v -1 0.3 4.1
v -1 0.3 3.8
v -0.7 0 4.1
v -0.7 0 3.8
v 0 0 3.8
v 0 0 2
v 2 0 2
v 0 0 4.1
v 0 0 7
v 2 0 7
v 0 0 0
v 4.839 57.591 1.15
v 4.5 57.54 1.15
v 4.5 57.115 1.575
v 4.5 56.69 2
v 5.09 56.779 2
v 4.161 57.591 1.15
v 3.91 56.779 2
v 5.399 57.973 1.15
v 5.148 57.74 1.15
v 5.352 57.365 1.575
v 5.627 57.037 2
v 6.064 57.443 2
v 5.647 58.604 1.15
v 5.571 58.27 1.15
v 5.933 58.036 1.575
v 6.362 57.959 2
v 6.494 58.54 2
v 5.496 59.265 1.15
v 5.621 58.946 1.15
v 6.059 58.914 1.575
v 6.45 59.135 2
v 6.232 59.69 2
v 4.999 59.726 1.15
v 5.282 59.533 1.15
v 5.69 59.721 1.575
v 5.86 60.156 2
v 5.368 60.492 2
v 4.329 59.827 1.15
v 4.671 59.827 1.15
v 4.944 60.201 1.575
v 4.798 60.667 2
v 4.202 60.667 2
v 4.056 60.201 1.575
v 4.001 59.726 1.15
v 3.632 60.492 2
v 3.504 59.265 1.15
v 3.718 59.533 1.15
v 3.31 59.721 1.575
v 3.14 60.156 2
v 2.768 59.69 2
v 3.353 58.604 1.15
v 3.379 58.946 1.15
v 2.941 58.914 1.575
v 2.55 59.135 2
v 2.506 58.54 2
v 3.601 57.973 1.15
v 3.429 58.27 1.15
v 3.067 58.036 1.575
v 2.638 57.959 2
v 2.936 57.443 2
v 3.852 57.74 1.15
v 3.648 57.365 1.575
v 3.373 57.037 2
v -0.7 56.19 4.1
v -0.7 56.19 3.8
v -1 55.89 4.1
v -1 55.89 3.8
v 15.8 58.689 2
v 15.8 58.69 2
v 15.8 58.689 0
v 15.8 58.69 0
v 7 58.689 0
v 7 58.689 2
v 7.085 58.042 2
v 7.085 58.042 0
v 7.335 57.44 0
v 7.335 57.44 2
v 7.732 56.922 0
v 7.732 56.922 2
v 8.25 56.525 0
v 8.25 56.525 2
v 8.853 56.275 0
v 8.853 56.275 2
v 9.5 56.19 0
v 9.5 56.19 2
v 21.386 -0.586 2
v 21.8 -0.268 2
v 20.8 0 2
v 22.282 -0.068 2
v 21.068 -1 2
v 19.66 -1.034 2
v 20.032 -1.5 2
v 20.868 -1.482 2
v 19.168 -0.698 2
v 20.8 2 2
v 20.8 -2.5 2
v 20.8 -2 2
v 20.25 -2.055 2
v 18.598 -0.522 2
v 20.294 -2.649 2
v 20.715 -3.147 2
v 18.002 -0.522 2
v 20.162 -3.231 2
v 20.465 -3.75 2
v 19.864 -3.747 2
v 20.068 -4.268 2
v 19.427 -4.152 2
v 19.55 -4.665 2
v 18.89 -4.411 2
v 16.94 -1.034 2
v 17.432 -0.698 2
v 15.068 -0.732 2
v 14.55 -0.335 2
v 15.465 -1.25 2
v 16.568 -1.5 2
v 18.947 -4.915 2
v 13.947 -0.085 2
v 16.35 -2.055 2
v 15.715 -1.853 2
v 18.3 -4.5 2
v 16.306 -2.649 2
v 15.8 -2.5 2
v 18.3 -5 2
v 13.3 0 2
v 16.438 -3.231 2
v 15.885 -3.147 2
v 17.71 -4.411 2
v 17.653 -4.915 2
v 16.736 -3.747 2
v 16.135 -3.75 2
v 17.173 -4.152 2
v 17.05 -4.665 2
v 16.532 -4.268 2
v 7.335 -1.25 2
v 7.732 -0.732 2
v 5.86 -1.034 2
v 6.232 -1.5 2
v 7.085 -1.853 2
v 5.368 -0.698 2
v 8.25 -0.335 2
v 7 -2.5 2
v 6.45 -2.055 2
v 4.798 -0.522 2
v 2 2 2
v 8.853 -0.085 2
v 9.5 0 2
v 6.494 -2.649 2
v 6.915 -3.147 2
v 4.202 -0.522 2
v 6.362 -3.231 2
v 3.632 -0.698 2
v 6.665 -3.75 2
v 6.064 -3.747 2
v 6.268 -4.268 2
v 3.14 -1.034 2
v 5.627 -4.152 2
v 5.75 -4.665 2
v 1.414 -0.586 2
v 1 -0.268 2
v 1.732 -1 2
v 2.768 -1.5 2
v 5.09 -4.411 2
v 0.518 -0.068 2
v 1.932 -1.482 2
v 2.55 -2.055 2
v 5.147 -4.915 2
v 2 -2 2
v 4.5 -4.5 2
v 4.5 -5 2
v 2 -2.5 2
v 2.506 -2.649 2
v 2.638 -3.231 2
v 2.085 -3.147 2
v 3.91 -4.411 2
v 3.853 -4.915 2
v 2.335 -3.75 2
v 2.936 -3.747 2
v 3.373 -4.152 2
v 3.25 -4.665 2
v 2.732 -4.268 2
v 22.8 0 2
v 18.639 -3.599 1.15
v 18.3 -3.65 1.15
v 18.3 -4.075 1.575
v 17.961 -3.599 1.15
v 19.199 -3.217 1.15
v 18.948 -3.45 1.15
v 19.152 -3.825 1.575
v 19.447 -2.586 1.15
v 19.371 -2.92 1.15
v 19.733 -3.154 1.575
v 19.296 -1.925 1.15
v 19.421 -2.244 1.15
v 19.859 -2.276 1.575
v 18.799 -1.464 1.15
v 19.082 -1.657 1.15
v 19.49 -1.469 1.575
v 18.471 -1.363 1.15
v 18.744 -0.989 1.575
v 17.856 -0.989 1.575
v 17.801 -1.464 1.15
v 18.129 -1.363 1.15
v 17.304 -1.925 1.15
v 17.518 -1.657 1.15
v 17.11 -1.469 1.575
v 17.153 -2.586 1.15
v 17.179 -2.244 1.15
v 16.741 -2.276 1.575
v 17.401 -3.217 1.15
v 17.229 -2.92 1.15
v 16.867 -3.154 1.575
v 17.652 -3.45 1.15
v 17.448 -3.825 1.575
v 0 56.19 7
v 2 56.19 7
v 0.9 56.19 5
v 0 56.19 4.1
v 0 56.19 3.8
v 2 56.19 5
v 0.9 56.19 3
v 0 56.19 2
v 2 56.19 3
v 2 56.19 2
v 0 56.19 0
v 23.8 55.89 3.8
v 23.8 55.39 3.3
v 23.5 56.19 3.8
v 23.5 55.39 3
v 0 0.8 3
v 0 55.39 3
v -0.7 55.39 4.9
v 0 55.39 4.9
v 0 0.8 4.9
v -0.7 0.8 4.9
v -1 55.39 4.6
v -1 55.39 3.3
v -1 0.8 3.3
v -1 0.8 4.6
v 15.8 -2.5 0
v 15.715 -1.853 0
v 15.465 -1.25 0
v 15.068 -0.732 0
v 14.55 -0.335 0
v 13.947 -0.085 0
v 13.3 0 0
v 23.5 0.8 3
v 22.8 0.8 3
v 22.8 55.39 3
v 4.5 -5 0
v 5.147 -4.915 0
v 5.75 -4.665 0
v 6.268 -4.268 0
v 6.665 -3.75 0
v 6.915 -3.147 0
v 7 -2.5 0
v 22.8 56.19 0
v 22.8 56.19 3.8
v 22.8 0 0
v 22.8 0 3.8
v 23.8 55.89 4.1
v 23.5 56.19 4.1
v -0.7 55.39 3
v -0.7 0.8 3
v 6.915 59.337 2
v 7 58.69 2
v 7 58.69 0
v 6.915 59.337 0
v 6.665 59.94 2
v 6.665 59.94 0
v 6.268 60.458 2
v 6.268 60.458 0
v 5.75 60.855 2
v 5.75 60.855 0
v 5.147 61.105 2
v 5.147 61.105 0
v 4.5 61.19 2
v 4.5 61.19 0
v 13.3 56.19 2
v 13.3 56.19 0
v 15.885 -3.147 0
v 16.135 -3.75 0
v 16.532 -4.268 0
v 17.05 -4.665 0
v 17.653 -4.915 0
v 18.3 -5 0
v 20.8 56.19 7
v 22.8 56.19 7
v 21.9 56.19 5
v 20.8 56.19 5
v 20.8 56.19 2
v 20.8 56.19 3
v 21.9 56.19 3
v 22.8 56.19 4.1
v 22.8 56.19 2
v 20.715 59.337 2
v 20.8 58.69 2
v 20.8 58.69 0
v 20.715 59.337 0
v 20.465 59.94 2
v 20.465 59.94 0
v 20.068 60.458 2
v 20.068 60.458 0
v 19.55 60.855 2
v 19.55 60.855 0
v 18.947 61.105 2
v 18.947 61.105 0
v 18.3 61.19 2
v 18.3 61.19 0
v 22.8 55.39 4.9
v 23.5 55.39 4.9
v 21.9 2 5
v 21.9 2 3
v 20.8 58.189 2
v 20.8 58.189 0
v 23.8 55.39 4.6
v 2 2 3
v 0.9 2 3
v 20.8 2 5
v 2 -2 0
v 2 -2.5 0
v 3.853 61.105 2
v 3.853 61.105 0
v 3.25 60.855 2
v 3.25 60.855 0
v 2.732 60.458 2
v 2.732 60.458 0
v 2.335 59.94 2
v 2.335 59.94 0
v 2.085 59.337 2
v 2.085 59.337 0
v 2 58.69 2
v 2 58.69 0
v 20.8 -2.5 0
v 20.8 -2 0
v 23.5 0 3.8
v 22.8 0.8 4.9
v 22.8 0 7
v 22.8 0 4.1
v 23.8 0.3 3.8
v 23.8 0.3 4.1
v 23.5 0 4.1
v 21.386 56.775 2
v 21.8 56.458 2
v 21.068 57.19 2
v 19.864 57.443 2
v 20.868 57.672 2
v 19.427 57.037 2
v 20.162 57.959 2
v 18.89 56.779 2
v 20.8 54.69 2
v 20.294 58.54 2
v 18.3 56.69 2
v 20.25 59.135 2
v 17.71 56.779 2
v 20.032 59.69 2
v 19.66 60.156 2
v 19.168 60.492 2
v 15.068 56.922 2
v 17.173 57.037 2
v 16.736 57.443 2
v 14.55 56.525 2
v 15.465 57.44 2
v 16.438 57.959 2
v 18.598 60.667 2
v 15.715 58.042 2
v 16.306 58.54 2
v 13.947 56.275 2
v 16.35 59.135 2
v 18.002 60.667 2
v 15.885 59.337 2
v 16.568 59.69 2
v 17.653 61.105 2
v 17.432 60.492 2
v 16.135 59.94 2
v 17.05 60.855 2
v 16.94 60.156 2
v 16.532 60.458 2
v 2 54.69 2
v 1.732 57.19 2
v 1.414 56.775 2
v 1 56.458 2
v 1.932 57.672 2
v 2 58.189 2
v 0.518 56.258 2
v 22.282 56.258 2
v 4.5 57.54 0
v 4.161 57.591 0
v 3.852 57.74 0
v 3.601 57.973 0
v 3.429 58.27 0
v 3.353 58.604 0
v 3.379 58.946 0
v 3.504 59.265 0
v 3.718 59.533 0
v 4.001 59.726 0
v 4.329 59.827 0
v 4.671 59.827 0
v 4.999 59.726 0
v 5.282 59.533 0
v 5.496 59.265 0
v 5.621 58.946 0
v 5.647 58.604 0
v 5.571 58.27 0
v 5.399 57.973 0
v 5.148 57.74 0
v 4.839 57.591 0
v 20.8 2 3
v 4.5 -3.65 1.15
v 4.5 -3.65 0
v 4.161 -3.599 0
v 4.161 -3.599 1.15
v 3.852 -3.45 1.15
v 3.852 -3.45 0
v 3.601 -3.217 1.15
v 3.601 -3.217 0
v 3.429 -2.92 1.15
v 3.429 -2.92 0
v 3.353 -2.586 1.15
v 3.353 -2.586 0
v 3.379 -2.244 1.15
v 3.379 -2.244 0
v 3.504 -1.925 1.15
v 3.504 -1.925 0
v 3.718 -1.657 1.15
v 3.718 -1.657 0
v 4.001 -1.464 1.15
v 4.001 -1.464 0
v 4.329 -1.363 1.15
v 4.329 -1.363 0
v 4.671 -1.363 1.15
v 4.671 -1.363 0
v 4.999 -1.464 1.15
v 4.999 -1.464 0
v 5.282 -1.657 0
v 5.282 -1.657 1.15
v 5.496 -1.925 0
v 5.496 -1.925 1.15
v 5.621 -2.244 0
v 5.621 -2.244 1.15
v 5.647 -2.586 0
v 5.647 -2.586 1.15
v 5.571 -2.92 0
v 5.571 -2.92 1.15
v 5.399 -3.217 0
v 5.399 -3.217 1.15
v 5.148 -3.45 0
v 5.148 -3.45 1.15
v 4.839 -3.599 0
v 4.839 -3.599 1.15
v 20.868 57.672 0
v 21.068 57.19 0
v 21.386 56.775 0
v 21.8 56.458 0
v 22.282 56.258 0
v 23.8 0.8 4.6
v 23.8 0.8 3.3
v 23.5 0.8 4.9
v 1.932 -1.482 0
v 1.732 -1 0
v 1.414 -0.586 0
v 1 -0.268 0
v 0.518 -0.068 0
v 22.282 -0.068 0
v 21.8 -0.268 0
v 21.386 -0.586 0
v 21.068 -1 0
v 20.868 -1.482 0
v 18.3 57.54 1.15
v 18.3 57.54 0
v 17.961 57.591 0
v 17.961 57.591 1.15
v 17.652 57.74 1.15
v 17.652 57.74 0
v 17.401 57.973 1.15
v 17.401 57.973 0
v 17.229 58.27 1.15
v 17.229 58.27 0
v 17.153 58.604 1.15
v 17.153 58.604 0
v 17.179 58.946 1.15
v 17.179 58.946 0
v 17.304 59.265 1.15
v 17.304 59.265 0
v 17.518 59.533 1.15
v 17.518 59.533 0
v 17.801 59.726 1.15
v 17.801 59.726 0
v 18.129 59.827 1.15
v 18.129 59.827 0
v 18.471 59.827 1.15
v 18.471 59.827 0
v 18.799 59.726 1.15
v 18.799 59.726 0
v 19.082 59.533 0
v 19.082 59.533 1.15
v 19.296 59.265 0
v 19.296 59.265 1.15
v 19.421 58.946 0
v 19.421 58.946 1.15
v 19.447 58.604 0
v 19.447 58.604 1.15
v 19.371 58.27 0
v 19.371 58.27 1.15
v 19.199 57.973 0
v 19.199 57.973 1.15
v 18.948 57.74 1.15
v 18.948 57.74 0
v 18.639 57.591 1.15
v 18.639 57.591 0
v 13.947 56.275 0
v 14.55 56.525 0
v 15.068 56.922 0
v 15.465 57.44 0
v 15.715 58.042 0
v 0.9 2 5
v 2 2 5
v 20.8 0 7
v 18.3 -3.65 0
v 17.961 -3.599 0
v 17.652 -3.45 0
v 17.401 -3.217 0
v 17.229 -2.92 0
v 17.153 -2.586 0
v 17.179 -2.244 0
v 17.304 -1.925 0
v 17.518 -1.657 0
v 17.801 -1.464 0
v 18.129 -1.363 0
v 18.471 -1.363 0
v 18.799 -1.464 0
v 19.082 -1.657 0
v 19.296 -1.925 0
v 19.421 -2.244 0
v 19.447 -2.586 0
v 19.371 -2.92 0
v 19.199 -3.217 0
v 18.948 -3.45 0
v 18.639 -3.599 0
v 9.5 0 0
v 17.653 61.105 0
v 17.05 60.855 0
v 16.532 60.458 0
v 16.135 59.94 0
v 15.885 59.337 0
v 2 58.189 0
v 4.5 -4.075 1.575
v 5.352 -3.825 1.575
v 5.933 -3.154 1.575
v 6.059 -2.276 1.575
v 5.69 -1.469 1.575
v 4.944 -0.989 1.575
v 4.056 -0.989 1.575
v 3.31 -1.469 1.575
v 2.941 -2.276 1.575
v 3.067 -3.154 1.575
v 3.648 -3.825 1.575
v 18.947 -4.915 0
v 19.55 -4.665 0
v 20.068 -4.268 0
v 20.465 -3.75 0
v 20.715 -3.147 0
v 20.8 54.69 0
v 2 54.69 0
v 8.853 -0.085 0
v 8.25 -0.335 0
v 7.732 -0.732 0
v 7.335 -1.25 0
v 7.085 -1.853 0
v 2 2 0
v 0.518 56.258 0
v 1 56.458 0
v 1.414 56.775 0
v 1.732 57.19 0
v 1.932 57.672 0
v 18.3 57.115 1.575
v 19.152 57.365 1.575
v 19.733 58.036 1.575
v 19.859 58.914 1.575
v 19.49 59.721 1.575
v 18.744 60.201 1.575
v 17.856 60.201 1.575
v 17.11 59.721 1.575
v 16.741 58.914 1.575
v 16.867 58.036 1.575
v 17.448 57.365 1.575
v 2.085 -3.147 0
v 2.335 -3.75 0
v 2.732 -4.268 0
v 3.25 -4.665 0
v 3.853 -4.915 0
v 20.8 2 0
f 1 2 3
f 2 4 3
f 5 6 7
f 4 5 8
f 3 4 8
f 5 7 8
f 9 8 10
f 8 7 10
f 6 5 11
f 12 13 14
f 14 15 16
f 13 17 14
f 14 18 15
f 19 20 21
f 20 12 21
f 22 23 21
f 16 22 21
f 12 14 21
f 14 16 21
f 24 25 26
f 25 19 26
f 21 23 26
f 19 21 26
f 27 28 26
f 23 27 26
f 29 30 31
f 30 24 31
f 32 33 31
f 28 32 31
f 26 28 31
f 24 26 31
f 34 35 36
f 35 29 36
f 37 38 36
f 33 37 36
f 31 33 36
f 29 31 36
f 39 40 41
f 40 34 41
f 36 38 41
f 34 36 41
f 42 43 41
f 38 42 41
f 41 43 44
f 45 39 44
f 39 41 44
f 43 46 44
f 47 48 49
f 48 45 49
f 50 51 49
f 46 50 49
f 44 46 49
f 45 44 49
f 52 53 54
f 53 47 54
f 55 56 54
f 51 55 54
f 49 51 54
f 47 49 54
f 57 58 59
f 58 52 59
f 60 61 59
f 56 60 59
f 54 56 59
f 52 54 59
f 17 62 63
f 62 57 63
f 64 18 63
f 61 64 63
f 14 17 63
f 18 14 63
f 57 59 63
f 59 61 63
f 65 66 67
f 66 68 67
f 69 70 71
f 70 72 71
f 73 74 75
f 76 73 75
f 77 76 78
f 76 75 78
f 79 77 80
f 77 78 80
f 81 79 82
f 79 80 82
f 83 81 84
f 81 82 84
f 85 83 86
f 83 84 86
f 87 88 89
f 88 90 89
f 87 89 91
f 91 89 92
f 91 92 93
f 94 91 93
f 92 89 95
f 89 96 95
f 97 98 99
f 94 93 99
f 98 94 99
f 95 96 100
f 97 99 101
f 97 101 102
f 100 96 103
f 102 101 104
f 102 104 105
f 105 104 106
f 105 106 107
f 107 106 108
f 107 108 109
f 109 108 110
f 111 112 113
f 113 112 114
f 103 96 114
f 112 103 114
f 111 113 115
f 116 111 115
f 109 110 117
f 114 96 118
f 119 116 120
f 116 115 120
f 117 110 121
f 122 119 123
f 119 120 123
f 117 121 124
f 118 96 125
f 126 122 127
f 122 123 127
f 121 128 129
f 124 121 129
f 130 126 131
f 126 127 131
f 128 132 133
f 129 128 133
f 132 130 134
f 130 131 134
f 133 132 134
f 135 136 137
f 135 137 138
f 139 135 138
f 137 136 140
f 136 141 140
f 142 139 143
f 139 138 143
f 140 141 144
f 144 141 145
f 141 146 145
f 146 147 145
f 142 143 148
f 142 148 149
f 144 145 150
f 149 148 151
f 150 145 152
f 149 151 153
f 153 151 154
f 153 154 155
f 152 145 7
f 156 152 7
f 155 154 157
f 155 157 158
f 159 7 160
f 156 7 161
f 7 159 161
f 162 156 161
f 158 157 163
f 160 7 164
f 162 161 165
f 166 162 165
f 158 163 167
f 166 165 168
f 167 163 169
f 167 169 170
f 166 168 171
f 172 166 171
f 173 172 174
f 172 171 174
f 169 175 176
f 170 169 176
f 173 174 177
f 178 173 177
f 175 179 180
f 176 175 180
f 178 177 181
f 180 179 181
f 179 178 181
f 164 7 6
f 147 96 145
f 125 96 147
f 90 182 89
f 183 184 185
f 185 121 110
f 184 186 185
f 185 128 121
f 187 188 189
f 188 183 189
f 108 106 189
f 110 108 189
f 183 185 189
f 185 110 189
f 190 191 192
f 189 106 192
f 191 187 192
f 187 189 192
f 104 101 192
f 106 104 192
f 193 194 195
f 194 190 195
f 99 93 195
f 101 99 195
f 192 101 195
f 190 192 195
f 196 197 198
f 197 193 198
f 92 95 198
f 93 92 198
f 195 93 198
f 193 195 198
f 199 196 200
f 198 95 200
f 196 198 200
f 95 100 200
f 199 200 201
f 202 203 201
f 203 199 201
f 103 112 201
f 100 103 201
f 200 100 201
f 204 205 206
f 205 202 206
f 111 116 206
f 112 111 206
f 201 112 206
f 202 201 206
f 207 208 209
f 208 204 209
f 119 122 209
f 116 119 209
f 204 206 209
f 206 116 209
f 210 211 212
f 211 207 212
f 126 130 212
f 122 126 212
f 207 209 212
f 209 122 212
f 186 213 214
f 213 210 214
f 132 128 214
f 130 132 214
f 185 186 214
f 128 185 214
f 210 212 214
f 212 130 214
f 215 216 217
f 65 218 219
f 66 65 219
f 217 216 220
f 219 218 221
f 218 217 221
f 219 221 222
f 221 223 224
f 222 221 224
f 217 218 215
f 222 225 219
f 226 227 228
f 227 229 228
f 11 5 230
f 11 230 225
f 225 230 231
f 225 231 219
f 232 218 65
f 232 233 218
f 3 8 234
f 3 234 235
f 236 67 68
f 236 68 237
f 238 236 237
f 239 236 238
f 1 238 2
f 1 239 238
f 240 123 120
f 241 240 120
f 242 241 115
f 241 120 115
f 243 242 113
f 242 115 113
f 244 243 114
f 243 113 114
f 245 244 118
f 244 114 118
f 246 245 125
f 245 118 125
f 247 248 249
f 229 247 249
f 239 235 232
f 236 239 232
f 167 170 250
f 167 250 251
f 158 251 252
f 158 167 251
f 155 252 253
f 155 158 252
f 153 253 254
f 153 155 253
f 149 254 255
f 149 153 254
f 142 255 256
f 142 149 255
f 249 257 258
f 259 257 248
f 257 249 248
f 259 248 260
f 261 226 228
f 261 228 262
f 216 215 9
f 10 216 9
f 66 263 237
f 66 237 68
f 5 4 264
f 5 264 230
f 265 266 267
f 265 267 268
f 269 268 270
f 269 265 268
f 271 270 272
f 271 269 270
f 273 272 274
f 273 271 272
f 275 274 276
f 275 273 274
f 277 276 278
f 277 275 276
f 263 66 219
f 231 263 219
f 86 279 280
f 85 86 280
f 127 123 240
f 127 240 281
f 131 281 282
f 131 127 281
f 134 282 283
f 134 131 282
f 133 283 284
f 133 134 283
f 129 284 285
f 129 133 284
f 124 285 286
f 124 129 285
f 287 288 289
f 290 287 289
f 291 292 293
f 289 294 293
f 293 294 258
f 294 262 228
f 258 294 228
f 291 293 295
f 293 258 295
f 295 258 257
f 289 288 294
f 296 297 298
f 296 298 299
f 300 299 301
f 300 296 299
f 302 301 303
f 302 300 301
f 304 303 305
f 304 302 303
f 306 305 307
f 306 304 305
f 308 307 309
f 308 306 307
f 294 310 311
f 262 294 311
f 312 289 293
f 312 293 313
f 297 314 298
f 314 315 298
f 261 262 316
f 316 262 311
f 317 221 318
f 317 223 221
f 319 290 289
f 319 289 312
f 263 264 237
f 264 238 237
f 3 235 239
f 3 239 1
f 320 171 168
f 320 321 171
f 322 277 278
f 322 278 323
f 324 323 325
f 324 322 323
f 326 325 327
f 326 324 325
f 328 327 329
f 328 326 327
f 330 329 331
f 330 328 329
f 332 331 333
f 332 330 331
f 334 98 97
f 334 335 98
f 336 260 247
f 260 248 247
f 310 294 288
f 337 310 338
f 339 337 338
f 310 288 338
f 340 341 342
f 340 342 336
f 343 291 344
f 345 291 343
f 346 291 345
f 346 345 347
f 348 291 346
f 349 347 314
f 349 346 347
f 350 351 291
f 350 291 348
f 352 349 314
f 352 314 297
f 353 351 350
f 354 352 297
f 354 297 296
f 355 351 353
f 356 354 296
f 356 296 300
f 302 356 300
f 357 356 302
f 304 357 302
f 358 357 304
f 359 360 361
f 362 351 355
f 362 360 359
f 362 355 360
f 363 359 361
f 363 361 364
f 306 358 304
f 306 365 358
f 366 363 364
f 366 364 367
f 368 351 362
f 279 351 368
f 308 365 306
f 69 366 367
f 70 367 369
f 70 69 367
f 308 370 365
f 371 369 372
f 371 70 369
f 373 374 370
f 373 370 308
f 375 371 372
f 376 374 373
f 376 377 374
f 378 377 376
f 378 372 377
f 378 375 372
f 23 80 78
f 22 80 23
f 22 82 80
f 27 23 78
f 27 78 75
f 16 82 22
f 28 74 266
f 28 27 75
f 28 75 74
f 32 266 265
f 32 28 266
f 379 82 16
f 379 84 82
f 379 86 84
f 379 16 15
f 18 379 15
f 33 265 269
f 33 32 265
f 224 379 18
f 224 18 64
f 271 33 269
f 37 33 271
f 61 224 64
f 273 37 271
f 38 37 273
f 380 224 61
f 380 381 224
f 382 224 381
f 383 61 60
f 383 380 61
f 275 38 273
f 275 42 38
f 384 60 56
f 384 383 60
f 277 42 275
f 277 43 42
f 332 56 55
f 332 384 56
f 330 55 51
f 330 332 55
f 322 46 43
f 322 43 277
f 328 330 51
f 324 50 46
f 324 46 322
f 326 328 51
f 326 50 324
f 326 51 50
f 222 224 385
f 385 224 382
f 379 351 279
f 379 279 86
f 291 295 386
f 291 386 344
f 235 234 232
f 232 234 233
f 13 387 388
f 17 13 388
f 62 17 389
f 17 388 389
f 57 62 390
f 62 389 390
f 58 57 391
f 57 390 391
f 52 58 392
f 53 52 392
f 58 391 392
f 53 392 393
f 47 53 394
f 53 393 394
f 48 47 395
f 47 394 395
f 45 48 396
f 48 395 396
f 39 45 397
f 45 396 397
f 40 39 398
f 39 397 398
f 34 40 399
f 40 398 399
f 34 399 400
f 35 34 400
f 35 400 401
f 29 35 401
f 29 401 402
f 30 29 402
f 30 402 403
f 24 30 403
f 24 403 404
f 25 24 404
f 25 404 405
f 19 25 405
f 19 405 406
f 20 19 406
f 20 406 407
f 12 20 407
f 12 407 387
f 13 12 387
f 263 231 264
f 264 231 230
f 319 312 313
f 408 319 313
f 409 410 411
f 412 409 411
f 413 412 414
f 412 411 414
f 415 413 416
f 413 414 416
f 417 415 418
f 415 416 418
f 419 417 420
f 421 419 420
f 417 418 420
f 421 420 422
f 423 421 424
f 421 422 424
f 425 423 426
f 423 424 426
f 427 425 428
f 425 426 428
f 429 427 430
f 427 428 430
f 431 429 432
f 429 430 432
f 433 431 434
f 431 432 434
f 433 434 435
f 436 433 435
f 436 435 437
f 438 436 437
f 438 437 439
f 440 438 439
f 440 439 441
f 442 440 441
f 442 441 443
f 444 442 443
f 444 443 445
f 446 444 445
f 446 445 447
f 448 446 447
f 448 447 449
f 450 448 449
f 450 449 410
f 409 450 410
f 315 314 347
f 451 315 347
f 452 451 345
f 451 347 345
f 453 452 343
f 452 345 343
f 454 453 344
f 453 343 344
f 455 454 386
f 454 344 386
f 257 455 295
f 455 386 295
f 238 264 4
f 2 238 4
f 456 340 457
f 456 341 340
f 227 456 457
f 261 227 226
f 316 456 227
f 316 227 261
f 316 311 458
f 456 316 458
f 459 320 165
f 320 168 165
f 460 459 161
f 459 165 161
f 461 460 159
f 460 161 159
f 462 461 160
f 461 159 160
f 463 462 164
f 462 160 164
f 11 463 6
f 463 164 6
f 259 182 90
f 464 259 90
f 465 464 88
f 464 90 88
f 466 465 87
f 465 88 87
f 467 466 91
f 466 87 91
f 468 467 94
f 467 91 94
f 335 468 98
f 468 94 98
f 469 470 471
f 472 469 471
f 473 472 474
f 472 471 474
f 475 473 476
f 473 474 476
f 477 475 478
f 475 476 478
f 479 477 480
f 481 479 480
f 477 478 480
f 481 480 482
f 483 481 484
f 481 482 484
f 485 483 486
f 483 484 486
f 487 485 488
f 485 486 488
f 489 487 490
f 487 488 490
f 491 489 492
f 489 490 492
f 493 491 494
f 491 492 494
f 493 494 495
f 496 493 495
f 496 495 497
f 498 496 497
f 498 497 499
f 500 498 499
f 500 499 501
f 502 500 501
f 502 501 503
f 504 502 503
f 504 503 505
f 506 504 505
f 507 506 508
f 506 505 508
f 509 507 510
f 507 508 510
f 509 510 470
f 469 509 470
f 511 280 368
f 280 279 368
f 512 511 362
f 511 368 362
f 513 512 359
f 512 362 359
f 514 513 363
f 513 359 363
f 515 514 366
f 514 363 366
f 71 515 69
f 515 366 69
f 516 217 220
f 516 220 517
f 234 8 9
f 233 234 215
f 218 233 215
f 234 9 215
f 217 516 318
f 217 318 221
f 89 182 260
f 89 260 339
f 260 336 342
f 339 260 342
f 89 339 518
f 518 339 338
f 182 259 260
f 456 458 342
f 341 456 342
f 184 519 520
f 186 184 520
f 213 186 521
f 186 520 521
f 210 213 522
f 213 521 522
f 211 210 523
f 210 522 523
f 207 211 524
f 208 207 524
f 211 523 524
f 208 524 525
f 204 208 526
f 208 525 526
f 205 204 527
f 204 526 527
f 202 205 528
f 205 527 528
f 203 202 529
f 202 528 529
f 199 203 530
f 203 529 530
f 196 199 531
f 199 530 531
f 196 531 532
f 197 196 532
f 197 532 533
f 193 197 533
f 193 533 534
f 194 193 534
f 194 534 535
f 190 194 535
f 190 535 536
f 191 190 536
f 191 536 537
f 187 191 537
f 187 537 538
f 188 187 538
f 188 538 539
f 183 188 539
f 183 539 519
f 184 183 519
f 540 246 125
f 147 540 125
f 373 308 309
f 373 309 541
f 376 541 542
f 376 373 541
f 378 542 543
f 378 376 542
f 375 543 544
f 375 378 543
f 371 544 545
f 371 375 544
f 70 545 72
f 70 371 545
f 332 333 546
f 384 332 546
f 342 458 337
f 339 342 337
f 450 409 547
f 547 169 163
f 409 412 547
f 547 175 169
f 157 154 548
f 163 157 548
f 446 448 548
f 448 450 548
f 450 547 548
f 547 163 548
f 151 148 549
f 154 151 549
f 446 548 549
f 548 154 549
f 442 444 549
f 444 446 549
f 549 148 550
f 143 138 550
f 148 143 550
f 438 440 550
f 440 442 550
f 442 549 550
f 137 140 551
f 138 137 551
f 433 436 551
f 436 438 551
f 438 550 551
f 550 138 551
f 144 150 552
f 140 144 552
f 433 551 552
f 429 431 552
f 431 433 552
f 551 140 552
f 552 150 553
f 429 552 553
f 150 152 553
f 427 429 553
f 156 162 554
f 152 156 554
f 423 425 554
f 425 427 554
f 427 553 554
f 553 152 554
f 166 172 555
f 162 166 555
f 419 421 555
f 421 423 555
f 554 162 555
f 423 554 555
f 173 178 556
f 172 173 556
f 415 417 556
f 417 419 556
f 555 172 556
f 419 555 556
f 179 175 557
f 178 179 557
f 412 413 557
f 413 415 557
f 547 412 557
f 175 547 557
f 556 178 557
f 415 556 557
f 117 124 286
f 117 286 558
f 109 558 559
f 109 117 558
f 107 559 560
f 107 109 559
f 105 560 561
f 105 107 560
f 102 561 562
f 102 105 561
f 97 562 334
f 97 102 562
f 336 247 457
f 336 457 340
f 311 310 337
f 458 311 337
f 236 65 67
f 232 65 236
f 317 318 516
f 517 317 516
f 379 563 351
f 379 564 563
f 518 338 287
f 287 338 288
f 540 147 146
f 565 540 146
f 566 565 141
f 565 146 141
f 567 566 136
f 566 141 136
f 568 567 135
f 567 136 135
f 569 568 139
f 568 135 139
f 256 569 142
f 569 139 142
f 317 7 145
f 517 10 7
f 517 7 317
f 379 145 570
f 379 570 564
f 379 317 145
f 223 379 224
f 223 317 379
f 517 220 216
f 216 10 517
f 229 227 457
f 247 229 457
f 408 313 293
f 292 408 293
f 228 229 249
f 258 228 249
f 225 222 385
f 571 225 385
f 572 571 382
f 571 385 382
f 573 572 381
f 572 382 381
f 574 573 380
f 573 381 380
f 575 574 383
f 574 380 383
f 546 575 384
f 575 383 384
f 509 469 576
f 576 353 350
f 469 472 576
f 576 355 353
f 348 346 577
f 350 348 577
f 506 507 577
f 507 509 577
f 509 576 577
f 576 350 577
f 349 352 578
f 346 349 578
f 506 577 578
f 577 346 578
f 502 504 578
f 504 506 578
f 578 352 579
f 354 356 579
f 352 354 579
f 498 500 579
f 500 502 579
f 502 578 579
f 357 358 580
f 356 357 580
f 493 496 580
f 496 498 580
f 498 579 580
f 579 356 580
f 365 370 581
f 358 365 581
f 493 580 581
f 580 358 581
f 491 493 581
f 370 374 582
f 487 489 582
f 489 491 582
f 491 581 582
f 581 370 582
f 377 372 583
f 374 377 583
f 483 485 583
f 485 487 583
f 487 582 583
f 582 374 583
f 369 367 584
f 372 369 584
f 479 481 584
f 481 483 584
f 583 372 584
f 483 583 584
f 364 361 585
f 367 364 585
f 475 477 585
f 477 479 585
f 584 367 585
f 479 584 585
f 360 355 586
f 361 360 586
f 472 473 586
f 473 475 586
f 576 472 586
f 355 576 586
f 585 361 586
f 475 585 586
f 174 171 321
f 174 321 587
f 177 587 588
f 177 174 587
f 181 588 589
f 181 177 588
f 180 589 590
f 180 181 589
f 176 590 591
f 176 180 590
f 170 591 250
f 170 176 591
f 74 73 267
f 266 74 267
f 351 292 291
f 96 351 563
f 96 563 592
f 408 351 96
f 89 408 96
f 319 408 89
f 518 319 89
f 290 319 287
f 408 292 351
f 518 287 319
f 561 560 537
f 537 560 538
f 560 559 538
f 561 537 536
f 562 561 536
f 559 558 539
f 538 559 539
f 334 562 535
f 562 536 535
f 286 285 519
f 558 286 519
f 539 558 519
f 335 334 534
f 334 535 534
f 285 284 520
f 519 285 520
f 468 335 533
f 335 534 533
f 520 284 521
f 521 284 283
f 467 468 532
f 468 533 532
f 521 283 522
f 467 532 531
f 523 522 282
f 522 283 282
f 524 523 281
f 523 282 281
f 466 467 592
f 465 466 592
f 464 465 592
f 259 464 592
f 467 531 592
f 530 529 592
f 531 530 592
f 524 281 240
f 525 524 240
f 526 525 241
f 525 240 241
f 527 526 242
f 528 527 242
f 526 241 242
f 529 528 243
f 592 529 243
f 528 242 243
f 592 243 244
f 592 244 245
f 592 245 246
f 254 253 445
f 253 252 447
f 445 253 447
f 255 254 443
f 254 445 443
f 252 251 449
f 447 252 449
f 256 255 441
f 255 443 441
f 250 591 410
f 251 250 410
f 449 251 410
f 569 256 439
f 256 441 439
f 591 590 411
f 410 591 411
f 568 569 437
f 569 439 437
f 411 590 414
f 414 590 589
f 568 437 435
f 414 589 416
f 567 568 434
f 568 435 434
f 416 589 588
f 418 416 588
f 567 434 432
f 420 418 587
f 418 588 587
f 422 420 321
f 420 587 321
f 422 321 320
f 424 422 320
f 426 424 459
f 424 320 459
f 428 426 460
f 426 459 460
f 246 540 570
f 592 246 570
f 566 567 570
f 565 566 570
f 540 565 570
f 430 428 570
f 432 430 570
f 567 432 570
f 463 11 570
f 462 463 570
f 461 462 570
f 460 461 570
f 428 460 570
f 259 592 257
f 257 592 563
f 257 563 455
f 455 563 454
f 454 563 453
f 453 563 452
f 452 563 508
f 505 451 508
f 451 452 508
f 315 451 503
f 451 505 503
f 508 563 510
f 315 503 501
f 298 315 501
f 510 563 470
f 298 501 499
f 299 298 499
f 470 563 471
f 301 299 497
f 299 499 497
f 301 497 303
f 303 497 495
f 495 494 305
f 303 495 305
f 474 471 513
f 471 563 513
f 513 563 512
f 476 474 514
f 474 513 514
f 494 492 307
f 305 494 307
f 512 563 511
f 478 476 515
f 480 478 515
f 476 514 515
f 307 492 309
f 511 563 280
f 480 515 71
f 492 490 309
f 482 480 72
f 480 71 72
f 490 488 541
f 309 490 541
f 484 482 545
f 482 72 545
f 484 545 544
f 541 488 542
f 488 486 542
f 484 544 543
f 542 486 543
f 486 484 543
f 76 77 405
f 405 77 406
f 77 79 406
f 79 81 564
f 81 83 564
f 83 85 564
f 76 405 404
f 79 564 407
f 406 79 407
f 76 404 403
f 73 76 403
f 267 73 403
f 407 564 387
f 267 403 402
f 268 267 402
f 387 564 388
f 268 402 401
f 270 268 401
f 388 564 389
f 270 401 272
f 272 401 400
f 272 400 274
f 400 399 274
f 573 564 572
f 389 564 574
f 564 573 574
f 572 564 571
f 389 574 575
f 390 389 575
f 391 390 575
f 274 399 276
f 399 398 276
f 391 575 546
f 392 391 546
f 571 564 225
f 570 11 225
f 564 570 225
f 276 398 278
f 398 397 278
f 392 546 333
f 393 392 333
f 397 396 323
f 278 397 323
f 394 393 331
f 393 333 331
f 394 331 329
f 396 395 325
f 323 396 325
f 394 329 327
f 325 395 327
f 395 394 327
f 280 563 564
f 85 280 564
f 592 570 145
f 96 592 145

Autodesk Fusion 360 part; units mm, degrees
sketch "Sketch1" plane through (0, 0, 0) normal (1, 0, 0) x (0, 1, 0)
  line L0 (0, 0) -> (56.1898, 0)
  line L1 (56.1898, 0) -> (56.1898, 7)
  line L2 (56.1898, 7) -> (0, 7)
  line L3 (0, 7) -> (0, 0)
  dimension "d1" = 7
extrude "Extrude1" add sketch "Sketch1" along normal blind 1
sketch "Sketch2" plane through (1, 0, 0) normal (1, 0, 0) x (0, 1, 0)
  line L0 (0, 7) -> (0, 0)
  line L1 (0, 0) -> (56.1898, 0)
  line L2 (56.1898, 0) -> (56.1898, 7)
  line L3 (56.1898, 7) -> (0, 7)
  line L4 (0, 0) -> (56.1898, 0)
  line L5 (56.1898, 0) -> (56.1898, 3)
  line L6 (56.1898, 3) -> (0, 3)
  line L7 (0, 3) -> (0, 0)
  line L8 (0, 7) -> (56.1898, 7)
  line L9 (56.1898, 7) -> (56.1898, 5)
  line L10 (56.1898, 5) -> (0, 5)
  line L11 (0, 5) -> (0, 7)
  line L12 (0, 3) -> (2, 3)
  line L13 (2, 3) -> (2, 5)
  line L14 (2, 5) -> (0, 5)
  line L15 (0, 5) -> (0, 3)
  dimension "d4" = 3
  dimension "d5" = 2
  dimension "d12" = 2
extrude "Extrude2" add sketch "Sketch2" along normal blind 1 contours L0 L2 L3 L8 L9 L10 L11 L14 | L0 L6 L10 L12 L13 L14 L15 | L0 L1 L2 L4 L5 L6 L7 L12
sketch "Sketch3" plane through (0, 0, 0) normal (-1, 0, 0) x (0, -1, 0)
  line L0 (0, 0) -> (0, 7)
  line L1 (0, 7) -> (-56.1898, 7)
  line L2 (-56.1898, 7) -> (-56.1898, 0)
  line L3 (-56.1898, 0) -> (0, 0)
  line L4 (-56.1898, 3) -> (0, 3)
  line L5 (0, 3) -> (0, 4.9)
  line L6 (0, 4.9) -> (-56.1898, 4.9)
  line L7 (-56.1898, 4.9) -> (-56.1898, 3)
  dimension "d8" = 1.9
  dimension "d9" = 3
extrude "Extrude3" add sketch "Sketch3" along normal blind 1 contours L0 L2 L4 L5 L6 L7
sketch "Sketch4" plane through (2, 0, 0) normal (1, 0, 0) x (0, 1, 0)
  line L0 (0, 7) -> (0, 0)
  line L1 (0, 0) -> (56.1898, 0)
  line L2 (56.1898, 0) -> (56.1898, 3)
  line L3 (56.1898, 3) -> (2, 3)
  line L4 (2, 3) -> (2, 5)
  line L5 (2, 5) -> (56.1898, 5)
  line L6 (56.1898, 5) -> (56.1898, 7)
  line L7 (56.1898, 7) -> (0, 7)
  line L8 (0, 0) -> (2, 0)
  line L9 (2, 0) -> (2, 2)
  line L10 (2, 2) -> (0, 2)
  line L11 (0, 2) -> (0, 0)
  line L12 (56.1898, 0) -> (54.6898, 0)
  line L13 (54.6898, 0) -> (54.6898, 2)
  line L14 (54.6898, 2) -> (56.1898, 2)
  line L15 (56.1898, 2) -> (56.1898, 0)
  dimension "d13" = 2
  dimension "d14" = 2
  dimension "d15" = 1.5
  dimension "d16" = 2
extrude "Extrude4" add sketch "Sketch4" along normal blind 9.4 contours L0 L1 L8 L9 L10 L11 | L1 L2 L12 L13 L14 L15
mirror "Mirror1" about plane through (11.4, 0, 0) normal (1, 0, 0) of bodies 1 merged
extrude "Extrude5" cut 1 faces at (21.8, 20.0633, 4.3333) along direction (1, 0, 0) blind 0.1
extrude "Extrude6" cut 1 faces at (1, 20.0633, 4.3333) along direction (-1, 0, 0) blind 0.1
sketch "Sketch5" plane through (0, 0, 0) normal (0, 0, -1) x (1, 0, 0)
  line L0 (20.8, -54.6898) -> (2, -54.6898)
  line L1 (2, -54.6898) -> (2, -2)
  line L2 (2, -2) -> (20.8, -2)
  line L3 (20.8, -2) -> (20.8, -54.6898)
  line L4 (0, -56.1898) -> (22.8, -56.1898)
  line L5 (22.8, -56.1898) -> (22.8, 0)
  line L6 (22.8, 0) -> (0, 0)
  line L7 (0, 0) -> (0, -56.1898)
  line L8 (2, 0) -> (7, 0)
  line L9 (7, 0) -> (7, 5)
  line L10 (7, 5) -> (2, 5)
  line L11 (2, 5) -> (2, 0)
  line L12 (15.8, 0) -> (20.8, 0)
  line L13 (20.8, 0) -> (20.8, 5)
  line L14 (20.8, 5) -> (15.8, 5)
  line L15 (15.8, 5) -> (15.8, 0)
  line L16 (2, -56.1898) -> (7, -56.1898)
  line L17 (7, -56.1898) -> (7, -61.1898)
  line L18 (7, -61.1898) -> (2, -61.1898)
  line L19 (2, -61.1898) -> (2, -56.1898)
  line L20 (15.8, -56.1898) -> (20.8, -56.1898)
  line L21 (20.8, -56.1898) -> (20.8, -61.1898)
  line L22 (20.8, -61.1898) -> (15.8, -61.1898)
  line L23 (15.8, -61.1898) -> (15.8, -56.1898)
  dimension "d25" = 5
  dimension "d26" = 5
  dimension "d27" = 5
  dimension "d28" = 5
  dimension "d30" = 2
  dimension "d31" = 2
  dimension "d32" = 5
  dimension "d33" = 5
  dimension "d34" = 5
  dimension "d35" = 5
  dimension "d36" = 2
  dimension "d37" = 2
extrude "Extrude7" add sketch "Sketch5" against normal blind 2 contours L4 L16 L17 L18 L19 | L6 L8 L9 L10 L11 | L4 L20 L21 L22 L23 | L6 L12 L13 L14 L15
sketch "Sketch6" plane through (0, 0, 2) normal (0, 0, 1) x (-1, 0, 0)
  line L0 (-2, -2) -> (-2, 0)
  line L1 (-2, 0) -> (-2, 5)
  line L2 (-2, 5) -> (-7, 5)
  line L3 (-7, 5) -> (-7, 0)
  line L4 (-7, 0) -> (-15.8, 0)
  line L5 (-15.8, 0) -> (-15.8, 5)
  line L6 (-15.8, 5) -> (-20.8, 5)
  line L7 (-20.8, 5) -> (-20.8, 0)
  line L8 (-20.8, 0) -> (-20.8, -2)
  line L9 (-20.8, -2) -> (-2, -2)
  circle A0 centre (-4.5, 2.5) radius 0.5
  circle A1 centre (-18.3, 2.5) radius 0.5
  circle A2 centre (-4.5, -58.6898) radius 0.5
  circle A3 centre (-18.3, -58.6898) radius 0.5
  line L10 (-7, -61.1898) -> (-2, -61.1898)
  dimension "d40" = 1
  dimension "d41" = 1
  dimension "d42" = 1
  dimension "d43" = 1
  dimension "d44" = 2.5
  dimension "d45" = 2.5
  dimension "d46" = 2.5
  dimension "d47" = 2.5
hole "Hole1" at (4.5, 58.6898, 2) at (18.3, 58.6898, 2) at (4.5, -2.5, 2) at (18.3, -2.5, 2) direction (0, 0, -1) diameter 2.3 depth 17 tip angle 180 countersink diameter 4 countersink angle 90
fillet "Fillet1" radius 2.5 12 edges at (7, -5, 1) (7, 0, 1) (2, -5, 1) (15.8, -5, 1) (20.8, -5, 1) (15.8, 0, 1) (20.8, 61.1898, 1) (15.8, 61.1898, 1) (7, 56.1898, 1) (7, 61.1898, 1) (2, 61.1898, 1) (15.8, 56.1898, 1)
fillet "Fillet1" radius 2 4 edges at (2, 56.1898, 1) (20.8, 56.1898, 1) (20.8, 0, 1) (2, 0, 1)
chamfer "Chamfer1" distance 0.8 angle 45 8 edges at (-0.5, 0, 4.9) (-0.5, 0, 3) (23.3, 0, 3) (23.3, 0, 4.9) (23.3, 56.1898, 4.9) (23.3, 56.1898, 3) (-0.5, 56.1898, 3) (-0.5, 56.1898, 4.9)
chamfer "Chamfer1" distance 0.3 angle 45 2 faces at (-1, 37.4599, 4.2667) (23.8, 37.4599, 4.2667)
equation "d17 = ( 20.8 / 2 ) * 1 mm - 1 mm"
